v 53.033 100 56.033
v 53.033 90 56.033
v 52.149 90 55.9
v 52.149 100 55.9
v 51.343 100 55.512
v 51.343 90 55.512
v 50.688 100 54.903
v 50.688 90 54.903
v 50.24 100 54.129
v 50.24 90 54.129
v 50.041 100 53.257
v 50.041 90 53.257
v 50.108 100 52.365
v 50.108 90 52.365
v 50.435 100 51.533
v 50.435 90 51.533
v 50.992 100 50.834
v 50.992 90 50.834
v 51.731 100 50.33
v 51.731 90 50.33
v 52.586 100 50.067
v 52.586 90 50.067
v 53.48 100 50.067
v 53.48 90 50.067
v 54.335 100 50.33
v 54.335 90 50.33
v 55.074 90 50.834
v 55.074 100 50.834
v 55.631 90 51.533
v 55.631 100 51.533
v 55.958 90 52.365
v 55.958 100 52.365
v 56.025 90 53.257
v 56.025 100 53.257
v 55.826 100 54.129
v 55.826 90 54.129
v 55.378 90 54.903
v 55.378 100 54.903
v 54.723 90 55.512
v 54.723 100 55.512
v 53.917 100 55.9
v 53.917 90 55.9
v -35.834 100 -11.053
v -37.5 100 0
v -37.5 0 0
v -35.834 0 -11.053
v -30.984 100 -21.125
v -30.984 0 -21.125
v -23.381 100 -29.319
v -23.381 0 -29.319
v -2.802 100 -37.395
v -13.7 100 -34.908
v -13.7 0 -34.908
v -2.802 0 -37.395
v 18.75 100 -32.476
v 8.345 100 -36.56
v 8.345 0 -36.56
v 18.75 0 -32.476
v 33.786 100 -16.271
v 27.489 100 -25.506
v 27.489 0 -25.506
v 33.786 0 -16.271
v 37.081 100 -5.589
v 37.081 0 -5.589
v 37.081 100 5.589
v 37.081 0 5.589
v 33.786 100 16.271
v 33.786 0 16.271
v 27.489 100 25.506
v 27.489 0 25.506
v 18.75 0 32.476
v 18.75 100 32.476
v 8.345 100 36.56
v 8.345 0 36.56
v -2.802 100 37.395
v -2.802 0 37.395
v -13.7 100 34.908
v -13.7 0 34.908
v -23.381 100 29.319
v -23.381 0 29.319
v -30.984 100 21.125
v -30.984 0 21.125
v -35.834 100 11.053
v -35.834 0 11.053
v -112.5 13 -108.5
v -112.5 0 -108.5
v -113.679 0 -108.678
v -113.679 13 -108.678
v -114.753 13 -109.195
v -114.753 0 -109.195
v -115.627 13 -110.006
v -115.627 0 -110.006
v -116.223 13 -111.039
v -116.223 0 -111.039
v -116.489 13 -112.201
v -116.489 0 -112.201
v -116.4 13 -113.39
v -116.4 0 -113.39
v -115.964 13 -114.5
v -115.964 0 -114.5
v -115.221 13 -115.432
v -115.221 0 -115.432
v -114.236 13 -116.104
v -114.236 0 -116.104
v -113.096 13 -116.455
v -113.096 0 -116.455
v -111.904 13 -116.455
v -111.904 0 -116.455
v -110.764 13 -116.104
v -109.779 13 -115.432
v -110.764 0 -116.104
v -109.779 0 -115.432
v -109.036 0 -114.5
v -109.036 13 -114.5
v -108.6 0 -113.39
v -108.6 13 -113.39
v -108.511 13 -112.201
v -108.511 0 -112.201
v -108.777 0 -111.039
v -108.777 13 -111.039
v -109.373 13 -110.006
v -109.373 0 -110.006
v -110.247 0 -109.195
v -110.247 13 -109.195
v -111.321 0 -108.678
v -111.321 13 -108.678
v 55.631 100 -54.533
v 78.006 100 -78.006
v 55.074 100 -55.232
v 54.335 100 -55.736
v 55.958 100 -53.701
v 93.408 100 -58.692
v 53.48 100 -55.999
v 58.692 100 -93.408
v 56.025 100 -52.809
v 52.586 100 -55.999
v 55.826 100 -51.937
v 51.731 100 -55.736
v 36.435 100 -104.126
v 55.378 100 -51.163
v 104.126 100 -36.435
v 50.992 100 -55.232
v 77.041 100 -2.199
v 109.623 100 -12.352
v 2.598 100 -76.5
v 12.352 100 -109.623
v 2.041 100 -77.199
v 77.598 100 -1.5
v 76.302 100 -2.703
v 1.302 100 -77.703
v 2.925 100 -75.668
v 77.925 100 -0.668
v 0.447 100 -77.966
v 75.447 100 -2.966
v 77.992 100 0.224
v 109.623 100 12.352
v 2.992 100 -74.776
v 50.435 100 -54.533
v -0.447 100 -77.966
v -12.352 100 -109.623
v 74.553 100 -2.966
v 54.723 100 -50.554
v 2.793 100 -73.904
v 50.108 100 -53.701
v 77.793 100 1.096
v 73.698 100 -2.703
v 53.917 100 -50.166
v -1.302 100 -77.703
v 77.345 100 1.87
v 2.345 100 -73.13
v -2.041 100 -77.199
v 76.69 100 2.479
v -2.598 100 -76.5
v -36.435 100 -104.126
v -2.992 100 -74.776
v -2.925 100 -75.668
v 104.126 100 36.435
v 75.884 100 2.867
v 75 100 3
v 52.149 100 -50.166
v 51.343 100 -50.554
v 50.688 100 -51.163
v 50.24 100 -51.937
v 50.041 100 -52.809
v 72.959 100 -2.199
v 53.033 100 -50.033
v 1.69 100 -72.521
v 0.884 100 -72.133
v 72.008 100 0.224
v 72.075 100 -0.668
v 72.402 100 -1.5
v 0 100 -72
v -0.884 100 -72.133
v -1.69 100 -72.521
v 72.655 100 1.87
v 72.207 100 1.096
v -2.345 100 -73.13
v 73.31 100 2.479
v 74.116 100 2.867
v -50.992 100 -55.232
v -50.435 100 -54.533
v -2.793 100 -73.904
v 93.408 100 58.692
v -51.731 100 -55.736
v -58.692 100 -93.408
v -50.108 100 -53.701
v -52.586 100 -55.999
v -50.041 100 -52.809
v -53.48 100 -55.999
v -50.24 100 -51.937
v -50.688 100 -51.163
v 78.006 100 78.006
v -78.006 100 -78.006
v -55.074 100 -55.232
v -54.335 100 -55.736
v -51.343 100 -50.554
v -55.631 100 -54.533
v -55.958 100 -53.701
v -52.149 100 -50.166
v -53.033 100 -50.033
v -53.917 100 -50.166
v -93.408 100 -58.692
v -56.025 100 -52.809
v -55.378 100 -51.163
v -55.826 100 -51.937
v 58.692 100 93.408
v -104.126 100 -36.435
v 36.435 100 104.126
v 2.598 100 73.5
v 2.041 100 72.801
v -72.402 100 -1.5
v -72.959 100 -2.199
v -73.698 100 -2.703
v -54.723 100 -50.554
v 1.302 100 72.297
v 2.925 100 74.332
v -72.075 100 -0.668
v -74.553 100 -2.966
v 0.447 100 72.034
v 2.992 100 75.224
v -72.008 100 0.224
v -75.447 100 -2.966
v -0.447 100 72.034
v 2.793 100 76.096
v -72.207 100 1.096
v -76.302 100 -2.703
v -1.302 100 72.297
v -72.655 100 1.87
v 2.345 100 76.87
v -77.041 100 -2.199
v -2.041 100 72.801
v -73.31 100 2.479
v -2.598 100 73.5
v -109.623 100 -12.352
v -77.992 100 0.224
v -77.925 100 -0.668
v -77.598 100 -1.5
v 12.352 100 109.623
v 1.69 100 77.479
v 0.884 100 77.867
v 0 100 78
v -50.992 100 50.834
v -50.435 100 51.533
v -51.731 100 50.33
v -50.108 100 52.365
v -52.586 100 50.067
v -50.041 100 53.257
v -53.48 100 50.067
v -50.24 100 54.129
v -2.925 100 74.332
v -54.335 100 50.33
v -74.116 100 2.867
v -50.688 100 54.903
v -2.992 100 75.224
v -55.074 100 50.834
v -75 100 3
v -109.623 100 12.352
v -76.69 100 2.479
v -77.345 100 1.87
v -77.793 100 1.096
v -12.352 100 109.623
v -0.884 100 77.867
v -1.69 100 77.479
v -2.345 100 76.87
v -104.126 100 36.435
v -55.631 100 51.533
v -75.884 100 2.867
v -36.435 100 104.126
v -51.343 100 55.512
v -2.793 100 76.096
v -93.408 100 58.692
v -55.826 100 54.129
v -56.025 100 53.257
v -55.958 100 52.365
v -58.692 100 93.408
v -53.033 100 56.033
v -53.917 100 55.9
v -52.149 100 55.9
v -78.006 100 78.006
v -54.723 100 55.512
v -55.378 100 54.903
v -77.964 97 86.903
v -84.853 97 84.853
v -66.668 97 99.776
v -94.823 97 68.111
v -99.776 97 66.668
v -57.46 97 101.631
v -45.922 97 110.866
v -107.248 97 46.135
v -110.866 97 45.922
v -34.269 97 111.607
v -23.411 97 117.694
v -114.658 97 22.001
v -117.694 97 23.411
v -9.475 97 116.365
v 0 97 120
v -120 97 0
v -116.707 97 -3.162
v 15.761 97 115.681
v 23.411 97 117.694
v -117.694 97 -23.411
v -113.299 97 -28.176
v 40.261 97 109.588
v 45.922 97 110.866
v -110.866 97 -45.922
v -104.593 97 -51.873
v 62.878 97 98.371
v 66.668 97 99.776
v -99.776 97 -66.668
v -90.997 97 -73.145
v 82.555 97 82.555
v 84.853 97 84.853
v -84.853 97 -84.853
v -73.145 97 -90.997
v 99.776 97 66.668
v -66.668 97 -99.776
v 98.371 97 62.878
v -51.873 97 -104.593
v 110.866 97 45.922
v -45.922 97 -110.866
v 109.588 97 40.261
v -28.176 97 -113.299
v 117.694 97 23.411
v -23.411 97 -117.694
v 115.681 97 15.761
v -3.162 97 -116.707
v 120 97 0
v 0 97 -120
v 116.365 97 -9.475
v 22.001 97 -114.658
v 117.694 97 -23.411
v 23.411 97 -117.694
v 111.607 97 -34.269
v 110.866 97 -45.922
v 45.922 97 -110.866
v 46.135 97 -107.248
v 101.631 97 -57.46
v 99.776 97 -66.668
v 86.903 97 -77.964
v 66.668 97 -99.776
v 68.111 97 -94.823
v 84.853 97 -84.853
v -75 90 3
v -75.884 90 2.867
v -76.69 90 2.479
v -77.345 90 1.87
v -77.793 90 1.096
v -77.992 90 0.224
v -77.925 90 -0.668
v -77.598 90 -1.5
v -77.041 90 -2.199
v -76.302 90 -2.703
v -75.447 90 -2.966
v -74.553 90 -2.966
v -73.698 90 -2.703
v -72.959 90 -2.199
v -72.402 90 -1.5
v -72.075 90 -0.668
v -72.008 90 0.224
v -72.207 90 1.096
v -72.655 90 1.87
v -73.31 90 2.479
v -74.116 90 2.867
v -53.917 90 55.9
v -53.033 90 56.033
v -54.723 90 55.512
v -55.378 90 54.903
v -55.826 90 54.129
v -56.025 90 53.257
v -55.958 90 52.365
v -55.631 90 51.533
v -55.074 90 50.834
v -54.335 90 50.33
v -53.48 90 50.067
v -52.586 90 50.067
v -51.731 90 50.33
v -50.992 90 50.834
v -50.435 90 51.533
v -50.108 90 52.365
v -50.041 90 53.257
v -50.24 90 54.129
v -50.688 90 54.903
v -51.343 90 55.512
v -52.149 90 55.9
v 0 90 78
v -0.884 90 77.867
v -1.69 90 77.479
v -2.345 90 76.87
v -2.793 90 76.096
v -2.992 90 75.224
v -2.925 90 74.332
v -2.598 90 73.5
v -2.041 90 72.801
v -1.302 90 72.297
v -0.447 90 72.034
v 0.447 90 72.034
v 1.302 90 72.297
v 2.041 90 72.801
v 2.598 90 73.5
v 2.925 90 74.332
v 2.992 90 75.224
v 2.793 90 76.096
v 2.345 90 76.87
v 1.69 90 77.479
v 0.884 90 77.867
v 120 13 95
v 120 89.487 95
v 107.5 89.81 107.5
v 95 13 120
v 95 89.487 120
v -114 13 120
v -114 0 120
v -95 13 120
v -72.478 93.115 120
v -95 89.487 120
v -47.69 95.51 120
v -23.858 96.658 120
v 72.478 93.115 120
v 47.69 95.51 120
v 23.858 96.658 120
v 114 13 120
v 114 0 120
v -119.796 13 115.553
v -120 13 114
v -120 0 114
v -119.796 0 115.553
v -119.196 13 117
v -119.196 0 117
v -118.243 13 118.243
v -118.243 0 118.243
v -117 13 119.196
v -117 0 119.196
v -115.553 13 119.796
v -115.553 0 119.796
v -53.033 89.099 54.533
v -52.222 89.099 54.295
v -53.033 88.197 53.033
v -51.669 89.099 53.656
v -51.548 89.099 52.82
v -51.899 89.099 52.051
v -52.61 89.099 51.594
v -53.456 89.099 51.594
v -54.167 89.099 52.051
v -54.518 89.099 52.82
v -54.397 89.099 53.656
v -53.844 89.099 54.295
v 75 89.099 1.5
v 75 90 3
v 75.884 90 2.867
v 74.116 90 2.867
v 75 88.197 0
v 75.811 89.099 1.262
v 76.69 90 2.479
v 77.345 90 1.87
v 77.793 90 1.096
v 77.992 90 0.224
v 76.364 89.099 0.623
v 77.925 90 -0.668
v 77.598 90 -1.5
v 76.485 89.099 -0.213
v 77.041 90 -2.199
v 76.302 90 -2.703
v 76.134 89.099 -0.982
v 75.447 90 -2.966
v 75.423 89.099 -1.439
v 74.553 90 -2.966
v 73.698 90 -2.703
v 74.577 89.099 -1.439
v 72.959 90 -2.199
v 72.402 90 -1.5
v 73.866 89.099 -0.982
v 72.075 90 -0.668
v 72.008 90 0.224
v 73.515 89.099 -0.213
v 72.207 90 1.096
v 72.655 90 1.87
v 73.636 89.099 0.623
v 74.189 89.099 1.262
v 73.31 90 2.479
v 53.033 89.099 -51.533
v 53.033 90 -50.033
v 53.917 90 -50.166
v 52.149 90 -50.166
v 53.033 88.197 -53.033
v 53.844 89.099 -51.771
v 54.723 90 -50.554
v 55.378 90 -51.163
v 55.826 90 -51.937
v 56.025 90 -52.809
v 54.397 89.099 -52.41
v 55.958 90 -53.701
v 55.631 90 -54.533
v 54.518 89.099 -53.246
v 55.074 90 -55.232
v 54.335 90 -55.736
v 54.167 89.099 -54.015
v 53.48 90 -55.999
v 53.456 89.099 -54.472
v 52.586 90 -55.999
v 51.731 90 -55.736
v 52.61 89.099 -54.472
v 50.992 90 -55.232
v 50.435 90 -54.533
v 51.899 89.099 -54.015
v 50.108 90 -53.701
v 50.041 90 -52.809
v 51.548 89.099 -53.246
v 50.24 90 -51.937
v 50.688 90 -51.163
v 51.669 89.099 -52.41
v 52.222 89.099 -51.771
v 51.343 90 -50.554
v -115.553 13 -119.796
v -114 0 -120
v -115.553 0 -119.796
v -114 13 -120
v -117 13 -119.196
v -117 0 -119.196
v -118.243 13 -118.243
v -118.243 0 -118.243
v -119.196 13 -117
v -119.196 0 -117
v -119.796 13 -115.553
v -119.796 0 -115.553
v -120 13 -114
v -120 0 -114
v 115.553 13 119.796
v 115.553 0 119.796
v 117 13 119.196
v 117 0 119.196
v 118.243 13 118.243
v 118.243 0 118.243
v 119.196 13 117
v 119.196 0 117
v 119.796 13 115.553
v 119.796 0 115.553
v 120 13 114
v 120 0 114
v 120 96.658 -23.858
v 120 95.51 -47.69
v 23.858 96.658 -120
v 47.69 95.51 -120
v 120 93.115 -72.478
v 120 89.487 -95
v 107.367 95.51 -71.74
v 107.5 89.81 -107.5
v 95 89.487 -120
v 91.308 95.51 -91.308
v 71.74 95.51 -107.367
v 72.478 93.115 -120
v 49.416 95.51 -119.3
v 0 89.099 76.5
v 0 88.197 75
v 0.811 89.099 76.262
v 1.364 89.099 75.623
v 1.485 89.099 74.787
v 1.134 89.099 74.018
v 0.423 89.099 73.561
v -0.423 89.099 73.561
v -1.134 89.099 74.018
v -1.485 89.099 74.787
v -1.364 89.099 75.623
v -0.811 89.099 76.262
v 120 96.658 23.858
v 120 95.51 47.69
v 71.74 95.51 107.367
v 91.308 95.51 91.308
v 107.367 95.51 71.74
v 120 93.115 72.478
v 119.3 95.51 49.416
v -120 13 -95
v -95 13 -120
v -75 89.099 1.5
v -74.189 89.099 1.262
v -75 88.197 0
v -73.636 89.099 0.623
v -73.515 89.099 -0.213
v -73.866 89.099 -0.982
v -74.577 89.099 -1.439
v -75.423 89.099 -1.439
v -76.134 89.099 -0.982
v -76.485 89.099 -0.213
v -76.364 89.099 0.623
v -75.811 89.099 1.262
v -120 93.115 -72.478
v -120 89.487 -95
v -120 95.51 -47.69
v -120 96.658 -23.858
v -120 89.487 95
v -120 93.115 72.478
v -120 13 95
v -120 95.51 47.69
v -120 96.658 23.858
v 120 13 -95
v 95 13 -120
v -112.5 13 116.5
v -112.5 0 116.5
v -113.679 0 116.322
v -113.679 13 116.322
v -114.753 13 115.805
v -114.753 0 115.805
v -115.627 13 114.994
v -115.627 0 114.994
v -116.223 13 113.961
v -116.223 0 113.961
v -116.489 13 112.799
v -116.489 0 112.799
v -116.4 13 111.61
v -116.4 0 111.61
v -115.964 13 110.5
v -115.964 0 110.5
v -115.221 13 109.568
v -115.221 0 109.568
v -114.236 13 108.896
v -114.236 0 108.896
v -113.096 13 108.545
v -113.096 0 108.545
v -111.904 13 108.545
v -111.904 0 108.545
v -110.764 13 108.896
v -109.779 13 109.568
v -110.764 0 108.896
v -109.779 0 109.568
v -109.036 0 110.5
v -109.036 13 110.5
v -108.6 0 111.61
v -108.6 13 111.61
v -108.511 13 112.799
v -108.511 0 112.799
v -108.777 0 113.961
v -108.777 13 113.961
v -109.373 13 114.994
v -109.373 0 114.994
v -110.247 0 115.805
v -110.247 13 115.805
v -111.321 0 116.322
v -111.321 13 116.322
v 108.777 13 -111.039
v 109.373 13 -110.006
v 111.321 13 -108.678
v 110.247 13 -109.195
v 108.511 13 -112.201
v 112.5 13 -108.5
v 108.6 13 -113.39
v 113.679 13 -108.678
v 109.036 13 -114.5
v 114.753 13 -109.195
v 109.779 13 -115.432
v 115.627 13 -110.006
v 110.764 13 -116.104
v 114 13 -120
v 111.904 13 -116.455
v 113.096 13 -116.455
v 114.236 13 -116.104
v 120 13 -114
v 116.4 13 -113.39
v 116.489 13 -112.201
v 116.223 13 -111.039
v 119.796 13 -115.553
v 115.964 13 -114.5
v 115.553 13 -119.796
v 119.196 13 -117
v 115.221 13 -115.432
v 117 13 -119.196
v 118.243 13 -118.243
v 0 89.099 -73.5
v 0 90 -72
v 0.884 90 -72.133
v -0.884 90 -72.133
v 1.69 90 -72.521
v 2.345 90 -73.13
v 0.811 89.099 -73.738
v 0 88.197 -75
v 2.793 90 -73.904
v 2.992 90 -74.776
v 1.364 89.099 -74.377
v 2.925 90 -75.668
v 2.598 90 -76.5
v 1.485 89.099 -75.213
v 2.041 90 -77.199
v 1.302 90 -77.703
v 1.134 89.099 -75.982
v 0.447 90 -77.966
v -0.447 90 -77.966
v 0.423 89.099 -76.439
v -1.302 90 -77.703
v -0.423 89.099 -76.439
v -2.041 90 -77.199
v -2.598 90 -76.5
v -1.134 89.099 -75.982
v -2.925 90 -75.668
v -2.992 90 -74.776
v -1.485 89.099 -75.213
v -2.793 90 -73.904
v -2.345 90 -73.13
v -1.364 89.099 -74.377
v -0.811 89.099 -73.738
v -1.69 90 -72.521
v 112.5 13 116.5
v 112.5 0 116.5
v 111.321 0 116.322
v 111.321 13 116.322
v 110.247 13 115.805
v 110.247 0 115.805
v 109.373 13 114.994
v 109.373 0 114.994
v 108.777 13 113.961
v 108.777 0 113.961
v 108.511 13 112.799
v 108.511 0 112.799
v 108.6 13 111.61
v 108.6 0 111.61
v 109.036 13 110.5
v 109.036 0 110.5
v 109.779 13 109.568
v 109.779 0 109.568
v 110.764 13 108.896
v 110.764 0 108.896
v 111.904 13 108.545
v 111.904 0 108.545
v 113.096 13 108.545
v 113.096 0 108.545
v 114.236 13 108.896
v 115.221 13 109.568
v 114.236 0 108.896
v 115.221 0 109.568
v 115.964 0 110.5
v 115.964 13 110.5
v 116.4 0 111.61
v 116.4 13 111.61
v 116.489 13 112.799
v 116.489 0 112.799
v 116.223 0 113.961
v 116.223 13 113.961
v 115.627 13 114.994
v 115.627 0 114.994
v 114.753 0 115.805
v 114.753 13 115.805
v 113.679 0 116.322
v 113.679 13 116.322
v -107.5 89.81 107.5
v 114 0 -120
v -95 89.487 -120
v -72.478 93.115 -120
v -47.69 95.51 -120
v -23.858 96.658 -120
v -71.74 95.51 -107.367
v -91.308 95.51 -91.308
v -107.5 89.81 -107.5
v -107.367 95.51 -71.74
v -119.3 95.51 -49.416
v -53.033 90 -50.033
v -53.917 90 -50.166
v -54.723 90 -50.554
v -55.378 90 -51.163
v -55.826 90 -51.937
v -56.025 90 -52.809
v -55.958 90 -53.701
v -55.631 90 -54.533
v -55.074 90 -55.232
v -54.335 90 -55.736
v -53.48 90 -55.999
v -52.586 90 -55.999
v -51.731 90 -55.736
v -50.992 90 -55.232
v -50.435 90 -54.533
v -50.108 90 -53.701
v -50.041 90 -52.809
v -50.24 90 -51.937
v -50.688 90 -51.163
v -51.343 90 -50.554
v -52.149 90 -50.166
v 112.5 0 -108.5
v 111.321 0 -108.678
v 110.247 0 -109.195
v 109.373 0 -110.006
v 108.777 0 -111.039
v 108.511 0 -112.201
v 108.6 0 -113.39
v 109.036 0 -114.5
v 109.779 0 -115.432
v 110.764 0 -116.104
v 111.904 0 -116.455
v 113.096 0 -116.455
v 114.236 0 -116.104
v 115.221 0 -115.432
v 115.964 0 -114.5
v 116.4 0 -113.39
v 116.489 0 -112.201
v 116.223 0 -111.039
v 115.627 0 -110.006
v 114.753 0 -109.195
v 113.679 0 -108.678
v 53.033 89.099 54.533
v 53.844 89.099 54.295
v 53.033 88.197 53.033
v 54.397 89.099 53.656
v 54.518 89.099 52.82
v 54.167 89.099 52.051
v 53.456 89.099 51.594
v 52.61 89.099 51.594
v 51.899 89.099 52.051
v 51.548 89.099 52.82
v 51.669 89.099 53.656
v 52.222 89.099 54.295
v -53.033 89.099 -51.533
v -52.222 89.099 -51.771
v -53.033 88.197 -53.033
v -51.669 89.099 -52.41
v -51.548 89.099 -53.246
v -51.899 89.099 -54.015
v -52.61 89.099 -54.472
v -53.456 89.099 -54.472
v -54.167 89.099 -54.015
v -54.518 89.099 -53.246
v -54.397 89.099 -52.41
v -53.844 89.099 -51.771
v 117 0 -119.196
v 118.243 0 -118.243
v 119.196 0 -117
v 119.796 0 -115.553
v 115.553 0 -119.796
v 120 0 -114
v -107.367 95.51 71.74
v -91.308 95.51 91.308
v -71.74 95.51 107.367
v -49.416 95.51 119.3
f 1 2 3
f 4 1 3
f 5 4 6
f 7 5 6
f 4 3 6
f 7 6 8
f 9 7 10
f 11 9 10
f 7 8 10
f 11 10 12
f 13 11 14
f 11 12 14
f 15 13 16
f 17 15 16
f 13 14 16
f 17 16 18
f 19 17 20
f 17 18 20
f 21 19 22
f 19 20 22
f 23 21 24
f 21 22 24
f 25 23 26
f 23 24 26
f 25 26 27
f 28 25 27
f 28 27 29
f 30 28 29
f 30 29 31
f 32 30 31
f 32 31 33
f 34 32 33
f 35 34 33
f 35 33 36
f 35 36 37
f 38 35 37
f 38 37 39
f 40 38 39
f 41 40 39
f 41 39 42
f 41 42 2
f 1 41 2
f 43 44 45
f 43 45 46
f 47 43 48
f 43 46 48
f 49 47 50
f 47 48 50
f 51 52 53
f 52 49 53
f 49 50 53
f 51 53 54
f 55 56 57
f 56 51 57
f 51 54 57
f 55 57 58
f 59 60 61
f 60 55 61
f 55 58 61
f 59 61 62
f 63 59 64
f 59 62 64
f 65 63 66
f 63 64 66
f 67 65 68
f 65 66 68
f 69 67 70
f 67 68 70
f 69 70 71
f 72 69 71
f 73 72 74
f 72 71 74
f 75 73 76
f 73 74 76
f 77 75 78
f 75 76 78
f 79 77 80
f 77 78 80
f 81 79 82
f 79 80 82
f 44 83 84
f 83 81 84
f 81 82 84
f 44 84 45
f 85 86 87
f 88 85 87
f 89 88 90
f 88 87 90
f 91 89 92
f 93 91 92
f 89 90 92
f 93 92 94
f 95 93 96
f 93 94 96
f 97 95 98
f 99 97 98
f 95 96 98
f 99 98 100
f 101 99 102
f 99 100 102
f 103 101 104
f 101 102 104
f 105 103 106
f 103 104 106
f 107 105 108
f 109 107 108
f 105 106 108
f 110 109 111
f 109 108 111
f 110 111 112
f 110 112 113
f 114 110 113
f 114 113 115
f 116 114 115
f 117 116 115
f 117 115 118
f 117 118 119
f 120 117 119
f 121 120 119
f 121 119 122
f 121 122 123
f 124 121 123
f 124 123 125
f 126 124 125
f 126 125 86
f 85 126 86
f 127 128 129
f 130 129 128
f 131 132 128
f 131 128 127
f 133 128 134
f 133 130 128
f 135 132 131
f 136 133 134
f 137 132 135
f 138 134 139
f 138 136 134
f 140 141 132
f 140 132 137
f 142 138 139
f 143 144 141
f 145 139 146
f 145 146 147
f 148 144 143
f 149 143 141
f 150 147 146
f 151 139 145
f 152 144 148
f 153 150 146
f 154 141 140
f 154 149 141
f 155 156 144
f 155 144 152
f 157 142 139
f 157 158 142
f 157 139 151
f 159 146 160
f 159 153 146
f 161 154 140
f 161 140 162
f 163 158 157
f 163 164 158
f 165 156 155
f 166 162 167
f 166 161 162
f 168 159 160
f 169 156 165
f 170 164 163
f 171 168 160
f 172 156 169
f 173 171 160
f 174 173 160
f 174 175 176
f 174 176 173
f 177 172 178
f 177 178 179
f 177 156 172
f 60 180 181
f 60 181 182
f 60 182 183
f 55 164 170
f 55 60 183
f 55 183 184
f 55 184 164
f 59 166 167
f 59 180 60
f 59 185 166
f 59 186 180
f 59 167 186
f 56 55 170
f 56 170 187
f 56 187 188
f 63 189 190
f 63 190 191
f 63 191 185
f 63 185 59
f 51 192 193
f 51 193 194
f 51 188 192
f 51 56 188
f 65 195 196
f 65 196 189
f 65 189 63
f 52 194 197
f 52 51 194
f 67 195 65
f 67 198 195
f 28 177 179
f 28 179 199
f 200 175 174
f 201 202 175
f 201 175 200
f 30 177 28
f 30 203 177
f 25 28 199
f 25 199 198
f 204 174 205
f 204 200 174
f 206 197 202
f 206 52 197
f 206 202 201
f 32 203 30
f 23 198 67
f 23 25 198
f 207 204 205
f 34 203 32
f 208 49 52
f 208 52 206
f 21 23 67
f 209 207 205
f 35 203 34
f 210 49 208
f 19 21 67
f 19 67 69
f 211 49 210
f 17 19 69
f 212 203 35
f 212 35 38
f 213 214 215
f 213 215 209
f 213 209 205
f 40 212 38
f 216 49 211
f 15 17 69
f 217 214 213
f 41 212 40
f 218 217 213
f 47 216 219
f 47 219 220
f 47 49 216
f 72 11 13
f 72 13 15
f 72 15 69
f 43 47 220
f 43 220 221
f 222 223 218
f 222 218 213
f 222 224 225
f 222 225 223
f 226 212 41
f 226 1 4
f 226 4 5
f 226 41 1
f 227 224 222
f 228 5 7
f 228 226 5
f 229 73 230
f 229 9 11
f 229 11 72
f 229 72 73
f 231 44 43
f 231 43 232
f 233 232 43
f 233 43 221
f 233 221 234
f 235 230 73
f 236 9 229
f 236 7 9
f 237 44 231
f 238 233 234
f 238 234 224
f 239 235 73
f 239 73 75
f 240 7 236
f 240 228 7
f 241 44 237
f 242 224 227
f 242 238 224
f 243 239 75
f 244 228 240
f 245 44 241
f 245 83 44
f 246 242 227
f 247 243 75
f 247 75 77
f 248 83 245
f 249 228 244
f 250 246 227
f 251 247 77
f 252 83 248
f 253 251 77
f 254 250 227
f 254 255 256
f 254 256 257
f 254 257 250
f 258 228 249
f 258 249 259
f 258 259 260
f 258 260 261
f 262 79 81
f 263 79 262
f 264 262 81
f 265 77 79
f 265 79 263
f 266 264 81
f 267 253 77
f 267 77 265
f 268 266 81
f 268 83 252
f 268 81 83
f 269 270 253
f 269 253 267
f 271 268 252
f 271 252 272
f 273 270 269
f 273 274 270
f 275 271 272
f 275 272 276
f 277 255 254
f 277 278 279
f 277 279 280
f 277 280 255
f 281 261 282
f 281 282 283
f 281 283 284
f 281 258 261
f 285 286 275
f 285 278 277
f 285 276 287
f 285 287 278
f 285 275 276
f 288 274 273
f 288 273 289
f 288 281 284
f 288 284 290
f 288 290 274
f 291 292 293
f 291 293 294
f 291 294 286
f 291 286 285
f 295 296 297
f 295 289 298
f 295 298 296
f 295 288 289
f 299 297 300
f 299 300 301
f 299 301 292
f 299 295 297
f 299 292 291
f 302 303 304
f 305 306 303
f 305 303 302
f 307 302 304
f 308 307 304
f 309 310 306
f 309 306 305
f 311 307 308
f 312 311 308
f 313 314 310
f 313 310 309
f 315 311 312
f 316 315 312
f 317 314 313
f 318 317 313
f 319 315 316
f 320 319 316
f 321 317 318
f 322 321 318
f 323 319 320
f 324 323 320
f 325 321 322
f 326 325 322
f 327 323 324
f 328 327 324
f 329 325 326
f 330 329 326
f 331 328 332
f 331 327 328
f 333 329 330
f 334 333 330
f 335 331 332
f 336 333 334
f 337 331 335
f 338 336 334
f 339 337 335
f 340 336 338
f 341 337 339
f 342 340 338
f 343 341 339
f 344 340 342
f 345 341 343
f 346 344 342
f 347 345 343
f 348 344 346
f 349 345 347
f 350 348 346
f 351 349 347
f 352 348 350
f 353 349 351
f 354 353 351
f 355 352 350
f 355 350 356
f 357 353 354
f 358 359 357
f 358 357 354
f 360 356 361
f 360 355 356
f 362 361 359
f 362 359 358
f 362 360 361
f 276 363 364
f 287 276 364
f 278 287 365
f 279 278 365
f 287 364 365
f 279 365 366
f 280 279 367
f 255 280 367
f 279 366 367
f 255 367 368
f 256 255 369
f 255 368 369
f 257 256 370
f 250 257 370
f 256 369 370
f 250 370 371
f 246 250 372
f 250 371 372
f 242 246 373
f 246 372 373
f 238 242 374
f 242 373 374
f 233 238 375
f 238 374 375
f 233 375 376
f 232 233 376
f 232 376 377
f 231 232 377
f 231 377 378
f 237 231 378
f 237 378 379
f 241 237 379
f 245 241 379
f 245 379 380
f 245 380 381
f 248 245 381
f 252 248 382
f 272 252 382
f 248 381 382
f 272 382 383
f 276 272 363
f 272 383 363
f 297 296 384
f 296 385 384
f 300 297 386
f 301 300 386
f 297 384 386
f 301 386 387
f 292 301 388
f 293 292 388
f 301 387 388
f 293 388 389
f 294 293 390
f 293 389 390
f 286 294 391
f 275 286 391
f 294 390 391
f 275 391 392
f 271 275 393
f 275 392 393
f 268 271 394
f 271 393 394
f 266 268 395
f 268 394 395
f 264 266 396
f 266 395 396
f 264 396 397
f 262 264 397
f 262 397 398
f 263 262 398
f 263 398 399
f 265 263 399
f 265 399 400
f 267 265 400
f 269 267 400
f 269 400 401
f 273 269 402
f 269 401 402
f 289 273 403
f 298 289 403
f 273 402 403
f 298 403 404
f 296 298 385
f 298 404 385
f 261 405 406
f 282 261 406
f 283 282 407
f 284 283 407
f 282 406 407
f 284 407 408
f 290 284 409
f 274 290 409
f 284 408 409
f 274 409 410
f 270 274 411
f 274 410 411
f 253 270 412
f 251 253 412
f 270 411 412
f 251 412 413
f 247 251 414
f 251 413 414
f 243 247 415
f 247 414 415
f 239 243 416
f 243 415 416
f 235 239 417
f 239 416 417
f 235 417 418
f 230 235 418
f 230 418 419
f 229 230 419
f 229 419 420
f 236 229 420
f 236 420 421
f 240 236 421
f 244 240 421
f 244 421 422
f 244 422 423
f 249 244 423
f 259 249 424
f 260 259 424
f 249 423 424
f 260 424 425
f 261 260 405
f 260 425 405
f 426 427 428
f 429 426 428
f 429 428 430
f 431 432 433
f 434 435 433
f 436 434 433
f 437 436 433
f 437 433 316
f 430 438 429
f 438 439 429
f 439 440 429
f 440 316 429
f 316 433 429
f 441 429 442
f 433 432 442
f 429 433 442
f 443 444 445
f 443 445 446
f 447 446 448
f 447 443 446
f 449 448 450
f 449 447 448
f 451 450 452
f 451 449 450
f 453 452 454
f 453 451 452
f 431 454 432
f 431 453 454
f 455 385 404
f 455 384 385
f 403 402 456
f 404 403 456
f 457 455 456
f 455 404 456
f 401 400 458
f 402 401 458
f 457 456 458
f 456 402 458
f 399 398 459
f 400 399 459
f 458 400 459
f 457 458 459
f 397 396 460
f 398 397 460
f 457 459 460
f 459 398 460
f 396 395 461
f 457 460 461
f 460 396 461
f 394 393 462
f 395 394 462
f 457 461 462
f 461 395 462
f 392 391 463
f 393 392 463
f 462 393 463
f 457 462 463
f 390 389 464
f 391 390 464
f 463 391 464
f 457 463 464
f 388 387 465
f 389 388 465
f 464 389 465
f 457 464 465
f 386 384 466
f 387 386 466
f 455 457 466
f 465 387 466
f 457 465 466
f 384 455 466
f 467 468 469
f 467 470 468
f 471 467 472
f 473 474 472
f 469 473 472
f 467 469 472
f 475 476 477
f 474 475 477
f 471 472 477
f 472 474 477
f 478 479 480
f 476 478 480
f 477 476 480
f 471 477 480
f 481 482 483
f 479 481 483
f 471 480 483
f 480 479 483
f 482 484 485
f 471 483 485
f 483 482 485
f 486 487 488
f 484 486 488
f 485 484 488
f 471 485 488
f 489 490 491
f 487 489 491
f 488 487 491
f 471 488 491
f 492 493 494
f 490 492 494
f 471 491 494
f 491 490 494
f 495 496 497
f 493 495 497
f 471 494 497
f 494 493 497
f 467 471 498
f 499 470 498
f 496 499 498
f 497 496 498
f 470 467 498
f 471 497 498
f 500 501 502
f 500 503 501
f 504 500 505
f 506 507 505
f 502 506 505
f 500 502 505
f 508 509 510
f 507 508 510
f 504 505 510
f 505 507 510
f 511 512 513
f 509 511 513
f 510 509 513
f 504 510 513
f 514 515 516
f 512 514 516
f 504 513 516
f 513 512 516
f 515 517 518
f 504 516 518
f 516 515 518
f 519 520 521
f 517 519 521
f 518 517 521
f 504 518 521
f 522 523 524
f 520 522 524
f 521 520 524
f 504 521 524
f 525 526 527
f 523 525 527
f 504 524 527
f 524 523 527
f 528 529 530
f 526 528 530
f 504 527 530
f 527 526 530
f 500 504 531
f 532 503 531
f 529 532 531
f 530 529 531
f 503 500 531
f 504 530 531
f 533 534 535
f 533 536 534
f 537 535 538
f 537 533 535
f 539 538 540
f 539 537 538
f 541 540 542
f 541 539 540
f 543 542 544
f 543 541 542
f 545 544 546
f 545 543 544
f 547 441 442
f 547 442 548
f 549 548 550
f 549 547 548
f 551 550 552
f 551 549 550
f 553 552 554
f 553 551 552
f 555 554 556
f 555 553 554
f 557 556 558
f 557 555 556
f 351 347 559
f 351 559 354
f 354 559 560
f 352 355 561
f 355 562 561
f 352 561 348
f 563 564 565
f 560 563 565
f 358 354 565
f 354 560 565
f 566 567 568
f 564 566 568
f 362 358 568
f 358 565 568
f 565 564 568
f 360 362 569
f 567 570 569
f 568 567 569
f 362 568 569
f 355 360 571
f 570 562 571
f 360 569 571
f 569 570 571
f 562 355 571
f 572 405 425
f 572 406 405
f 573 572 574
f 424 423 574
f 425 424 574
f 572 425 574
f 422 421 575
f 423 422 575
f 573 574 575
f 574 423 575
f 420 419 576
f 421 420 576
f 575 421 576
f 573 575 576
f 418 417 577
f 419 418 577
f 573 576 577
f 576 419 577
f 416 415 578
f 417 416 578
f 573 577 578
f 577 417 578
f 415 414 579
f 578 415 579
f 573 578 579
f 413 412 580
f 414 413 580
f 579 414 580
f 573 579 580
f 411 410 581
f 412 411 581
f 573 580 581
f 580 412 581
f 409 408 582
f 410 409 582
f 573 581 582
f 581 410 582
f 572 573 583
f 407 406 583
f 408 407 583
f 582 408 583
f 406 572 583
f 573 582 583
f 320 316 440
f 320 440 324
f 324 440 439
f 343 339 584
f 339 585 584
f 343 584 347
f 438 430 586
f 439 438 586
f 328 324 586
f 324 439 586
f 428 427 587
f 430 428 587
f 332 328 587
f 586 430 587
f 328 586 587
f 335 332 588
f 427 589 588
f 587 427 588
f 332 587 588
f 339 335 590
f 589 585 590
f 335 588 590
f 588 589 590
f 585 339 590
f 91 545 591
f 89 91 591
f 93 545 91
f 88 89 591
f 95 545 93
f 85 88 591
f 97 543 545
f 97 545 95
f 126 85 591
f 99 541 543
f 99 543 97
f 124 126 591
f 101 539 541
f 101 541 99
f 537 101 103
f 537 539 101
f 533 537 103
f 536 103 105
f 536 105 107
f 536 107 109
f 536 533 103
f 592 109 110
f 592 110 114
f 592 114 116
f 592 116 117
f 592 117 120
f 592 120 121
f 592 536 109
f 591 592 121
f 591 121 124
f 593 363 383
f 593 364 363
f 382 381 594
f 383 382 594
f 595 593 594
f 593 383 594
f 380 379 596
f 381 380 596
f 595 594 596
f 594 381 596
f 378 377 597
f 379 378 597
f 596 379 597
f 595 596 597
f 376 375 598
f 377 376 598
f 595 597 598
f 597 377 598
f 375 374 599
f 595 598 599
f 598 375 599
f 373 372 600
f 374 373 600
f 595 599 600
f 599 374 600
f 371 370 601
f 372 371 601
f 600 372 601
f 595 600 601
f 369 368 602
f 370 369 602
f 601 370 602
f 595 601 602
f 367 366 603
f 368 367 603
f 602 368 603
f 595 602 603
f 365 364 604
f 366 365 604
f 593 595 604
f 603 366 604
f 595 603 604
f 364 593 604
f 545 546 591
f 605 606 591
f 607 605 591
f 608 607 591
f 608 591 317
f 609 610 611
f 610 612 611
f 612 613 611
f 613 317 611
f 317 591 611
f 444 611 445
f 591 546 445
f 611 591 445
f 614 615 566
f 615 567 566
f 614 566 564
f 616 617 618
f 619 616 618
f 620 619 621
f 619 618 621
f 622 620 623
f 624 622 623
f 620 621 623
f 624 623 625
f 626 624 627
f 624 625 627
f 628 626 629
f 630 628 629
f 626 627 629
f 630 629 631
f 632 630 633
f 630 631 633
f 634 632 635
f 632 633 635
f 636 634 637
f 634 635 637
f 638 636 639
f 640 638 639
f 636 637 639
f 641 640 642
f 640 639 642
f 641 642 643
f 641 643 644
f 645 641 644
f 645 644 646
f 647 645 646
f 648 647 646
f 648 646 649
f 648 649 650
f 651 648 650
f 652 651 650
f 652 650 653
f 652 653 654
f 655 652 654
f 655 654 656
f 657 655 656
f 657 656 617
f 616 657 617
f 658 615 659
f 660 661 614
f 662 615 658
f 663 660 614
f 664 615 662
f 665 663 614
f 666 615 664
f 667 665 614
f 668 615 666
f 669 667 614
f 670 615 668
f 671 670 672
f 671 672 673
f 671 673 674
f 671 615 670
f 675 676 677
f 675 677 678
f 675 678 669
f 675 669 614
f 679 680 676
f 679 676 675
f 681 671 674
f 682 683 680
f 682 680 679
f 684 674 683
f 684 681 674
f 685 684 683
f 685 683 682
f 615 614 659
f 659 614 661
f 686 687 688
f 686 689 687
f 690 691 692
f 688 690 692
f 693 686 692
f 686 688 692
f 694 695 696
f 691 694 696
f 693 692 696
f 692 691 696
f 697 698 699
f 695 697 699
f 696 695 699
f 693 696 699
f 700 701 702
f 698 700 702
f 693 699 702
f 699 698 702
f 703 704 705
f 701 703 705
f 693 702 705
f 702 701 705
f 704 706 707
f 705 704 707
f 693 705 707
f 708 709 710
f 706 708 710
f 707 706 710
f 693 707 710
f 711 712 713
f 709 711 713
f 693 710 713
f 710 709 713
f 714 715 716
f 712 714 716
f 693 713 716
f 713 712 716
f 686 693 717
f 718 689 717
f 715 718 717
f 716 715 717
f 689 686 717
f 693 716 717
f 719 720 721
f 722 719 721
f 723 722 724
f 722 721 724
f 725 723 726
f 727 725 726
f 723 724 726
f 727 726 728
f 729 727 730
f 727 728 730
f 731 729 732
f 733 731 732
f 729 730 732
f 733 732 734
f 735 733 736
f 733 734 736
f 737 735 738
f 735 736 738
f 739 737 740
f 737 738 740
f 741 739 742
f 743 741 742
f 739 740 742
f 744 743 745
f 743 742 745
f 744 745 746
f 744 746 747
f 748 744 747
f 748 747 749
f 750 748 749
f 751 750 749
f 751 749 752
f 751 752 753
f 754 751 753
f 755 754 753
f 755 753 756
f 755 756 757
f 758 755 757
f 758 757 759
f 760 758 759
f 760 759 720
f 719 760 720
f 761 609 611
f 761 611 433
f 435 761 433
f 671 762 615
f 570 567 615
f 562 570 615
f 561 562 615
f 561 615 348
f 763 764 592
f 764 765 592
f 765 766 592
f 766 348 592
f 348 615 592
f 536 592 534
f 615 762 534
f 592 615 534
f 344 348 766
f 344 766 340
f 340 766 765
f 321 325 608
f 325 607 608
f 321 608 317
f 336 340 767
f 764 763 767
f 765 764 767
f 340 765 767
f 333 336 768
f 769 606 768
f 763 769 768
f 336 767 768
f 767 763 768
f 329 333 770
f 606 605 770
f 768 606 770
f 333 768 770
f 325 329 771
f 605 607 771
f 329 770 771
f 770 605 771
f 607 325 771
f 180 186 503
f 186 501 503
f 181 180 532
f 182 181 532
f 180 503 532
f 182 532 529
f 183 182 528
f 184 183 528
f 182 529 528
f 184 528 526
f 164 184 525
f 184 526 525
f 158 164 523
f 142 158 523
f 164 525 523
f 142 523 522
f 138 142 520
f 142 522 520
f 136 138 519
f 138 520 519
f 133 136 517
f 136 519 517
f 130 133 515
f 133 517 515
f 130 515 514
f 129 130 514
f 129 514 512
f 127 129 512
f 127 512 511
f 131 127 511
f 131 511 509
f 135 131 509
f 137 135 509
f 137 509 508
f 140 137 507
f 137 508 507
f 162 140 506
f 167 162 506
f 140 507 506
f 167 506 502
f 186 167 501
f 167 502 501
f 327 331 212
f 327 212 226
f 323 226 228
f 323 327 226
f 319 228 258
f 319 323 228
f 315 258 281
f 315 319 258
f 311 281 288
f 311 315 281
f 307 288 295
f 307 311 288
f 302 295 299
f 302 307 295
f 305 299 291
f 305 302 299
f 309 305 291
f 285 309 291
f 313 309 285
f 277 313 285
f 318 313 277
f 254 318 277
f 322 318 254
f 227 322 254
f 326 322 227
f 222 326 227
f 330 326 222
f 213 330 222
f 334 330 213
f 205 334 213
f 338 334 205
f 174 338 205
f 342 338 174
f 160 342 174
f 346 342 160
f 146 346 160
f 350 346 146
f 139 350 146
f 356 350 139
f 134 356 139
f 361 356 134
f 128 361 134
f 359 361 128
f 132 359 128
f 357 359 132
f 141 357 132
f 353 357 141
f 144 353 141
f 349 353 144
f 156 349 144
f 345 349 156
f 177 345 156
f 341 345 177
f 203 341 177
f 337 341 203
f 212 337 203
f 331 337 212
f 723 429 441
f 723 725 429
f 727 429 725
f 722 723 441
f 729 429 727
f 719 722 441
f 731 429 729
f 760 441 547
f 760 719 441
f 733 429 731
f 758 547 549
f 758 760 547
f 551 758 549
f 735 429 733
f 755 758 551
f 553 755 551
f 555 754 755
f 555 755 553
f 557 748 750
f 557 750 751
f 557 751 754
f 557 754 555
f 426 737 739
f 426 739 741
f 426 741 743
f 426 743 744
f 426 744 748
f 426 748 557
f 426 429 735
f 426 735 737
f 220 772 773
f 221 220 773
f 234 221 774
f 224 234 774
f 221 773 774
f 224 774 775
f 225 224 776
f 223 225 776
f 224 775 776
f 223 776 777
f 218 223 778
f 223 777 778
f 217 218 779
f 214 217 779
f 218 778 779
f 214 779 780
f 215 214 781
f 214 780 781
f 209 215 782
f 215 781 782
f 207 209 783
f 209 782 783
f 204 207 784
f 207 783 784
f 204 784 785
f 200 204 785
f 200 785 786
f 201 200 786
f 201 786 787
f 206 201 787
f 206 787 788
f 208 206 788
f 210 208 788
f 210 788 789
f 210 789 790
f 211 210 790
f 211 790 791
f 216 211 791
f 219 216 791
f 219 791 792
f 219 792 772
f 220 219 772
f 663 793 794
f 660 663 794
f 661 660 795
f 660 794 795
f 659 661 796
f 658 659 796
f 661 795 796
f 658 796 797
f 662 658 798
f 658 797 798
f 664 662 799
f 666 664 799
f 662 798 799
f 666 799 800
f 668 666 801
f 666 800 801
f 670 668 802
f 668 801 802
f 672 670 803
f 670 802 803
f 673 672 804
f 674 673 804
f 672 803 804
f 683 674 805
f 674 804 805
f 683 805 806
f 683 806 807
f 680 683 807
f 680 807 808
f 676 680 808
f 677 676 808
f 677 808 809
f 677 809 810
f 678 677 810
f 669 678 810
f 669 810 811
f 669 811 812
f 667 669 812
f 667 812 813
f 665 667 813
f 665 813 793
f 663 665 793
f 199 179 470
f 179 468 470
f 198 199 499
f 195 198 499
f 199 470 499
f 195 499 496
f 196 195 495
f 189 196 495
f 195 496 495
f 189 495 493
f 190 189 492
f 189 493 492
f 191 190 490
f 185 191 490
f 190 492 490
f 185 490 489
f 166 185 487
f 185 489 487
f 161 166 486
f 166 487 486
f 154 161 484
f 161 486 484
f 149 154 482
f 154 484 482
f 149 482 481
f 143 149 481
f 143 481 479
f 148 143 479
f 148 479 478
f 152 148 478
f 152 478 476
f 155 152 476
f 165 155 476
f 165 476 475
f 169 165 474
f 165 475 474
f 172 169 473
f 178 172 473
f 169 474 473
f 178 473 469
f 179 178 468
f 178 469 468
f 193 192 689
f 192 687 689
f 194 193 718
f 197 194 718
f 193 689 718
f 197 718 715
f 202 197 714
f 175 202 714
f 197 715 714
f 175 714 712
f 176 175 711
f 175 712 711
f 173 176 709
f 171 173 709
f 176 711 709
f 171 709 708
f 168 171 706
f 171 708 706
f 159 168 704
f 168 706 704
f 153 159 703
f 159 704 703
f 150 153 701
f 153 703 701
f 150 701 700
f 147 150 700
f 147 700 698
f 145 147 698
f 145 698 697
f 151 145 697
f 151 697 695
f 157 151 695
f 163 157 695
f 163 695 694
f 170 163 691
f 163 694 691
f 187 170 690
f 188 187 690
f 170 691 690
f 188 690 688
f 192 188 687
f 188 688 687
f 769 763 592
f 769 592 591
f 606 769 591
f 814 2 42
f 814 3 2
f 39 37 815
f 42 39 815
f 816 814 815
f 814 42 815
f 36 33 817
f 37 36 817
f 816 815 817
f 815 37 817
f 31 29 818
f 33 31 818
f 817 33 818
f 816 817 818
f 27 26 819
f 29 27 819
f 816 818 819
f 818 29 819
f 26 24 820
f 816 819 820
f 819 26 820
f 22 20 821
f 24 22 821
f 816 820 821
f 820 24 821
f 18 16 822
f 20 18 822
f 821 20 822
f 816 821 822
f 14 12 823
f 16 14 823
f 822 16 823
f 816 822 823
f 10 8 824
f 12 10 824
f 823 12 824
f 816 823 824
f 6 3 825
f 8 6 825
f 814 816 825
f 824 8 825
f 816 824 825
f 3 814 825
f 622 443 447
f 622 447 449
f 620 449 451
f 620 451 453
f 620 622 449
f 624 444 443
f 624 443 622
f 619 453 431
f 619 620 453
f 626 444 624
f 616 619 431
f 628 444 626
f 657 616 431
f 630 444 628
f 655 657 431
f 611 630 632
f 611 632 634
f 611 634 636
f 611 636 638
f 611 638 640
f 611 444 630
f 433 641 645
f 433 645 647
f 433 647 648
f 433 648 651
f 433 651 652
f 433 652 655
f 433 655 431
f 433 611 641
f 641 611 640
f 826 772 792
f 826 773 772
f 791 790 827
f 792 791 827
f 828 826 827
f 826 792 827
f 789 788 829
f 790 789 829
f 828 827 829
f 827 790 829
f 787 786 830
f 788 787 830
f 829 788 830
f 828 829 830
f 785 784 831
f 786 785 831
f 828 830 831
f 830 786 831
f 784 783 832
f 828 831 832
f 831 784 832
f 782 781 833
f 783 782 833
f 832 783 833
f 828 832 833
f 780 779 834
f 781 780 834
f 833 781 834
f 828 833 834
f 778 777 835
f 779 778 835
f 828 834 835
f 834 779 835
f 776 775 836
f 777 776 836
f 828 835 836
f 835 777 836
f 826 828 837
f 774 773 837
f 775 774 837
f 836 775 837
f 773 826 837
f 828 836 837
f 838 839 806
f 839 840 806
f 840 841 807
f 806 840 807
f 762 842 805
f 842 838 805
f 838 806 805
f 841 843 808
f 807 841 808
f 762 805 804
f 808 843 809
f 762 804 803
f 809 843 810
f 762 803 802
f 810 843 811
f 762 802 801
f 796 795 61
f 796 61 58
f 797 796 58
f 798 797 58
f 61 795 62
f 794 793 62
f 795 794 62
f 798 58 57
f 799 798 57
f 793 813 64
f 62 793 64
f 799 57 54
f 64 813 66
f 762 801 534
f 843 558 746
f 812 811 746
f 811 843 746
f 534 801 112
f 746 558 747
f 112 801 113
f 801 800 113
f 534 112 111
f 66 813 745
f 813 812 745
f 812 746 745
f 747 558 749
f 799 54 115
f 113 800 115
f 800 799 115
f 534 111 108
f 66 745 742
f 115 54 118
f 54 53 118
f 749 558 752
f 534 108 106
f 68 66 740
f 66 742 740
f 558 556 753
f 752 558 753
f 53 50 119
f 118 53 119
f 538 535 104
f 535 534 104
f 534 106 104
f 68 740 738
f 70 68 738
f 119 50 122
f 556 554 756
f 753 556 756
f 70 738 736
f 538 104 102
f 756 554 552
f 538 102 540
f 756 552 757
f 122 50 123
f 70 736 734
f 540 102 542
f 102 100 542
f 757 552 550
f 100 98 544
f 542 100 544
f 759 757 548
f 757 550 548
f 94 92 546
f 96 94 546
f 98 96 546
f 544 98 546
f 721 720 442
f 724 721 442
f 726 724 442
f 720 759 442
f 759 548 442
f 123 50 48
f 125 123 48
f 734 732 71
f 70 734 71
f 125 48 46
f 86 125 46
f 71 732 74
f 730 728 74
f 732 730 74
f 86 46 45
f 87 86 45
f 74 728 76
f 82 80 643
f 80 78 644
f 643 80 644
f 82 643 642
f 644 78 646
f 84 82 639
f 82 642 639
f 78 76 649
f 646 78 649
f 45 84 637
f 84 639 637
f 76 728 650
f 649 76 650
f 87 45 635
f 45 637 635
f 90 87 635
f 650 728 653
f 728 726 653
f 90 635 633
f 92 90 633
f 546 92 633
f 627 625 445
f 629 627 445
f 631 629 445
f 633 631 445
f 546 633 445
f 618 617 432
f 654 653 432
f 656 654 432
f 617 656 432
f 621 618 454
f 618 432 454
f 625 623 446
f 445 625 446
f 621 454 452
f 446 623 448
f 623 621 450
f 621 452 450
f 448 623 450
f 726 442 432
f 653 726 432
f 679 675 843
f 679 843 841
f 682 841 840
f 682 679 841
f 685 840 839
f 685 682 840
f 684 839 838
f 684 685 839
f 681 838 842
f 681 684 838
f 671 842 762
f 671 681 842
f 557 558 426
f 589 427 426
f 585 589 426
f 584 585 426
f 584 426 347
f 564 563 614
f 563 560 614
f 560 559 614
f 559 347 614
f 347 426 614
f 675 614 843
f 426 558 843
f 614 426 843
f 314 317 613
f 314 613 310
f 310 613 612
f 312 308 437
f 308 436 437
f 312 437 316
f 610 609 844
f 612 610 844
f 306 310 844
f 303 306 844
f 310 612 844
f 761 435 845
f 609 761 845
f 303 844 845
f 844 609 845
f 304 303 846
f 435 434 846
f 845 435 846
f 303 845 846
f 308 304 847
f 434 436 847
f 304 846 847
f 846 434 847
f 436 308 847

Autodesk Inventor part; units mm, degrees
ref_plane "YZ Plane" through (0, 0, 0) normal (1, 0, 0) x (0, 1, 0)
ref_plane "XZ Plane" through (0, 0, 0) normal (0, 1, 0) x (-1, 0, 0)
sketch "Sketch1" plane through (0, 0, 0) normal (0, 1, 0) x (-1, 0, 0)
  point P0 (0, 0)
sketch "Sketch2" plane through (0, 0, 0) normal (0, 1, 0) x (-1, 0, 0)
  line L0 (120, 120) -> (-120, 120)
  line L1 (-120, 120) -> (-120, -120)
  line L2 (-120, -120) -> (120, -120)
  line L3 (120, -120) -> (120, 120)
  circle A0 centre (0, 0) radius 37.5
  dimension "d0" = 240
  dimension "d1" = 240
  dimension "d3" = 120
  dimension "d4" = 120
  dimension "d5" = 75
extrude "Extrusion1" add sketch "Sketch2" along normal blind 100
fillet "Fillet1" radius 6 1 edges at (-120, 50, -120)
fillet "Fillet2" radius 6 1 edges at (120, 50, -120)
fillet "Fillet3" radius 6 1 edges at (120, 50, 120)
fillet "Fillet4" radius 6 1 edges at (-120, 50, 120)
sketch "Sketch3" plane through (0, 100, 0) normal (0, 1, 0) x (1, 0, 0)
  line L0 (0, 0) -> (75, 0) construction
  point P0 (-75, 0)
  point P1 (0, 75)
  point P2 (0, 75)
  point P3 (0, -75)
  point P4 (-53.033, 53.033)
  point P5 (-53.033, 53.033)
  point P6 (53.033, 53.033)
  point P7 (53.033, -53.033)
  point P8 (-53.033, -53.033)
  dimension "d14" = 53.033
  dimension "d15" = 53.033
  dimension "d16" = 53.033
  dimension "d17" = 53.033
  dimension "d18" = 53.033
  dimension "d19" = 53.033
hole "Hole1" at (-75, 100, 0) at (75, 100, 0) at (0, 100, -75) at (0, 100, 75) at (-53.033, 100, -53.033) at (53.033, 100, -53.033) at (53.033, 100, 53.033) at (-53.033, 100, 53.033) direction (0, -1, 0) diameter 6 depth 10 tip angle 118
sketch "Sketch4" plane through (0, 100, 0) normal (0, 1, 0) x (1, 0, 0)
  point P0 (0, 0)
  point P1 (-112.5, 112.5)
  point P2 (-112.5, -112.5)
  point P3 (112.5, -112.5)
  point P4 (112.5, 112.5)
  dimension "d34" = 112.5
  dimension "d35" = 112.5
hole "Hole2" at (-112.5, 100, -112.5) at (-112.5, 100, 112.5) at (112.5, 100, 112.5) at (112.5, 100, -112.5) direction (0, -1, 0) diameter 8 end through all
sketch "Sketch5" plane through (0, 100, 0) normal (0, 1, 0) x (1, 0, 0)
  line L0 (95, 120) -> (120, 95)
  line L1 (120, -114) -> (120, 114) projected
  line L2 (95, 120) -> (130.3553, 120) construction
  line L3 (114, 120) -> (-114, 120) projected
  line L4 (-95, 120) -> (-120, 95)
  line L5 (-120, 114) -> (-120, -114) projected
  line L6 (-95, 120) -> (-59.6447, 120) construction
  line L7 (95, 120) -> (120, 120)
  line L8 (120, 120) -> (120, 95)
  line L9 (-95, 120) -> (-120, 120)
  line L10 (-120, 120) -> (-120, 95)
  point P0 (0, 0)
  dimension "d36" = 45
  dimension "d38" = 135
extrude "Extrusion2" cut sketch "Sketch5" against normal blind 87 contours L3 L7 L8 L1 L0
sketch "Sketch6" plane through (0, 100, 0) normal (0, 1, 0) x (1, 0, 0)
  line L0 (114, 120) -> (-114, 120)
  line L1 (-95, 120) -> (-120, 95)
  line L2 (-120, 114) -> (-120, -114)
  line L3 (-95, 120) -> (-59.6447, 120) construction
  line L4 (-95, 120) -> (-120, 120)
  line L5 (-120, 120) -> (-120, 95)
  point P0 (0, 0)
  dimension "d41" = 135
extrude "Extrusion3" cut sketch "Sketch6" against normal blind 87
sketch "Sketch7" plane through (0, 100, 0) normal (0, 1, 0) x (1, 0, 0)
  line L0 (120, -114) -> (120, 95) projected
  line L1 (120, -95) -> (95, -120)
  line L2 (-114, -120) -> (114, -120) projected
  line L3 (120, -95) -> (155.3553, -95) construction
  line L4 (120, -95) -> (120, -120)
  line L5 (120, -120) -> (95, -120)
  point P0 (0, 0)
  dimension "d44" = 135
extrude "Extrusion4" cut sketch "Sketch7" against normal blind 87
sketch "Sketch8" plane through (0, 100, 0) normal (0, 1, 0) x (1, 0, 0)
  line L0 (-120, 95) -> (-120, -114) projected
  line L1 (-120, -95) -> (-95, -120)
  line L2 (-114, -120) -> (95, -120) projected
  line L3 (-120, -95) -> (-84.6447, -95) construction
  line L4 (-95, -120) -> (-120, -120)
  line L5 (-120, -120) -> (-120, -95)
  point P0 (0, 0)
  dimension "d47" = 45
extrude "Extrusion5" cut sketch "Sketch8" against normal blind 87
sketch "Sketch9" plane through (0, 100, 0) normal (0, 1, 0) x (1, 0, 0)
  circle A0 centre (0, 0) radius 116.75
  line L0 (120, 120) -> (-120, 120)
  line L1 (-120, 120) -> (-120, -120)
  line L2 (-120, -120) -> (120, -120)
  line L3 (120, -120) -> (120, 120)
  dimension "d50" = 233.5
  dimension "d53" = 240
  dimension "d54" = 240
extrude "Extrusion6" cut sketch "Sketch9" against normal blind 3
ref_plane "Work Plane1" through (0, 0, 0) normal (0.7071, 0, -0.7071) x (0, 1, 0)
sketch "Sketch10" plane through (0, 0, 0) normal (0.7071, 0, -0.7071) x (0, 1, 0)
  line L0 (97, 116.75) -> (135.5145, 116.75) construction
  line L1 (97, -116.75) -> (97, 116.75) projected
  line L2 (97, 116.75) -> (151.2428, 116.75) construction
  line L3 (-153.1261, 0) -> (197.3136, 0) projected
  arc A0 (97, 120) -> (84.2851, 167.4528) centre (-101.0801, 92.3545) ccw
  line L4 (97, 120) -> (84.2851, 167.4528) construction
  line L5 (97, 120) -> (146.1267, 120) construction
  line L6 (84.2851, 167.4528) -> (97, 167.4528)
  line L7 (97, 167.4528) -> (97, 120)
  line L8 (97, 17.6777) -> (97, 152.028) projected
  line L9 (100, -116.75) -> (100, 116.75) projected
  point P0 (0, 0)
  dimension "d62" = 105
  dimension "d63" = 200
  dimension "d64" = 120
  dimension "d65" = 3
revolve "Revolution1" cut sketch "Sketch10" angle 360 about axis through (0, -10, 0) along (0, 1, 0)
sketch "Sketch11" plane through (0, 0, 0) normal (0.7071, 0, -0.7071) x (0, 1, 0)
  line L0 (97, -116.75) -> (97, 116.75) projected
  line L1 (97, 116.75) -> (100, 110.3165)
  line L2 (100, -116.75) -> (100, 116.75) projected
  line L3 (97, 116.75) -> (104.0986, 116.75) construction
  line L4 (100, 110.3165) -> (100, 116.75)
  line L5 (100, 116.75) -> (97, 116.75)
  line L6 (-21.7182, 0) -> (130.3093, 0) projected
  point P0 (0, 0)
  dimension "d66" = 65
revolve "Revolution2" cut sketch "Sketch11" angle 360 about axis through (0, -10, 0) along (0, 1, 0) contours L5 L2 L1
properties part number "DT240" material "Aluminum 6061"
